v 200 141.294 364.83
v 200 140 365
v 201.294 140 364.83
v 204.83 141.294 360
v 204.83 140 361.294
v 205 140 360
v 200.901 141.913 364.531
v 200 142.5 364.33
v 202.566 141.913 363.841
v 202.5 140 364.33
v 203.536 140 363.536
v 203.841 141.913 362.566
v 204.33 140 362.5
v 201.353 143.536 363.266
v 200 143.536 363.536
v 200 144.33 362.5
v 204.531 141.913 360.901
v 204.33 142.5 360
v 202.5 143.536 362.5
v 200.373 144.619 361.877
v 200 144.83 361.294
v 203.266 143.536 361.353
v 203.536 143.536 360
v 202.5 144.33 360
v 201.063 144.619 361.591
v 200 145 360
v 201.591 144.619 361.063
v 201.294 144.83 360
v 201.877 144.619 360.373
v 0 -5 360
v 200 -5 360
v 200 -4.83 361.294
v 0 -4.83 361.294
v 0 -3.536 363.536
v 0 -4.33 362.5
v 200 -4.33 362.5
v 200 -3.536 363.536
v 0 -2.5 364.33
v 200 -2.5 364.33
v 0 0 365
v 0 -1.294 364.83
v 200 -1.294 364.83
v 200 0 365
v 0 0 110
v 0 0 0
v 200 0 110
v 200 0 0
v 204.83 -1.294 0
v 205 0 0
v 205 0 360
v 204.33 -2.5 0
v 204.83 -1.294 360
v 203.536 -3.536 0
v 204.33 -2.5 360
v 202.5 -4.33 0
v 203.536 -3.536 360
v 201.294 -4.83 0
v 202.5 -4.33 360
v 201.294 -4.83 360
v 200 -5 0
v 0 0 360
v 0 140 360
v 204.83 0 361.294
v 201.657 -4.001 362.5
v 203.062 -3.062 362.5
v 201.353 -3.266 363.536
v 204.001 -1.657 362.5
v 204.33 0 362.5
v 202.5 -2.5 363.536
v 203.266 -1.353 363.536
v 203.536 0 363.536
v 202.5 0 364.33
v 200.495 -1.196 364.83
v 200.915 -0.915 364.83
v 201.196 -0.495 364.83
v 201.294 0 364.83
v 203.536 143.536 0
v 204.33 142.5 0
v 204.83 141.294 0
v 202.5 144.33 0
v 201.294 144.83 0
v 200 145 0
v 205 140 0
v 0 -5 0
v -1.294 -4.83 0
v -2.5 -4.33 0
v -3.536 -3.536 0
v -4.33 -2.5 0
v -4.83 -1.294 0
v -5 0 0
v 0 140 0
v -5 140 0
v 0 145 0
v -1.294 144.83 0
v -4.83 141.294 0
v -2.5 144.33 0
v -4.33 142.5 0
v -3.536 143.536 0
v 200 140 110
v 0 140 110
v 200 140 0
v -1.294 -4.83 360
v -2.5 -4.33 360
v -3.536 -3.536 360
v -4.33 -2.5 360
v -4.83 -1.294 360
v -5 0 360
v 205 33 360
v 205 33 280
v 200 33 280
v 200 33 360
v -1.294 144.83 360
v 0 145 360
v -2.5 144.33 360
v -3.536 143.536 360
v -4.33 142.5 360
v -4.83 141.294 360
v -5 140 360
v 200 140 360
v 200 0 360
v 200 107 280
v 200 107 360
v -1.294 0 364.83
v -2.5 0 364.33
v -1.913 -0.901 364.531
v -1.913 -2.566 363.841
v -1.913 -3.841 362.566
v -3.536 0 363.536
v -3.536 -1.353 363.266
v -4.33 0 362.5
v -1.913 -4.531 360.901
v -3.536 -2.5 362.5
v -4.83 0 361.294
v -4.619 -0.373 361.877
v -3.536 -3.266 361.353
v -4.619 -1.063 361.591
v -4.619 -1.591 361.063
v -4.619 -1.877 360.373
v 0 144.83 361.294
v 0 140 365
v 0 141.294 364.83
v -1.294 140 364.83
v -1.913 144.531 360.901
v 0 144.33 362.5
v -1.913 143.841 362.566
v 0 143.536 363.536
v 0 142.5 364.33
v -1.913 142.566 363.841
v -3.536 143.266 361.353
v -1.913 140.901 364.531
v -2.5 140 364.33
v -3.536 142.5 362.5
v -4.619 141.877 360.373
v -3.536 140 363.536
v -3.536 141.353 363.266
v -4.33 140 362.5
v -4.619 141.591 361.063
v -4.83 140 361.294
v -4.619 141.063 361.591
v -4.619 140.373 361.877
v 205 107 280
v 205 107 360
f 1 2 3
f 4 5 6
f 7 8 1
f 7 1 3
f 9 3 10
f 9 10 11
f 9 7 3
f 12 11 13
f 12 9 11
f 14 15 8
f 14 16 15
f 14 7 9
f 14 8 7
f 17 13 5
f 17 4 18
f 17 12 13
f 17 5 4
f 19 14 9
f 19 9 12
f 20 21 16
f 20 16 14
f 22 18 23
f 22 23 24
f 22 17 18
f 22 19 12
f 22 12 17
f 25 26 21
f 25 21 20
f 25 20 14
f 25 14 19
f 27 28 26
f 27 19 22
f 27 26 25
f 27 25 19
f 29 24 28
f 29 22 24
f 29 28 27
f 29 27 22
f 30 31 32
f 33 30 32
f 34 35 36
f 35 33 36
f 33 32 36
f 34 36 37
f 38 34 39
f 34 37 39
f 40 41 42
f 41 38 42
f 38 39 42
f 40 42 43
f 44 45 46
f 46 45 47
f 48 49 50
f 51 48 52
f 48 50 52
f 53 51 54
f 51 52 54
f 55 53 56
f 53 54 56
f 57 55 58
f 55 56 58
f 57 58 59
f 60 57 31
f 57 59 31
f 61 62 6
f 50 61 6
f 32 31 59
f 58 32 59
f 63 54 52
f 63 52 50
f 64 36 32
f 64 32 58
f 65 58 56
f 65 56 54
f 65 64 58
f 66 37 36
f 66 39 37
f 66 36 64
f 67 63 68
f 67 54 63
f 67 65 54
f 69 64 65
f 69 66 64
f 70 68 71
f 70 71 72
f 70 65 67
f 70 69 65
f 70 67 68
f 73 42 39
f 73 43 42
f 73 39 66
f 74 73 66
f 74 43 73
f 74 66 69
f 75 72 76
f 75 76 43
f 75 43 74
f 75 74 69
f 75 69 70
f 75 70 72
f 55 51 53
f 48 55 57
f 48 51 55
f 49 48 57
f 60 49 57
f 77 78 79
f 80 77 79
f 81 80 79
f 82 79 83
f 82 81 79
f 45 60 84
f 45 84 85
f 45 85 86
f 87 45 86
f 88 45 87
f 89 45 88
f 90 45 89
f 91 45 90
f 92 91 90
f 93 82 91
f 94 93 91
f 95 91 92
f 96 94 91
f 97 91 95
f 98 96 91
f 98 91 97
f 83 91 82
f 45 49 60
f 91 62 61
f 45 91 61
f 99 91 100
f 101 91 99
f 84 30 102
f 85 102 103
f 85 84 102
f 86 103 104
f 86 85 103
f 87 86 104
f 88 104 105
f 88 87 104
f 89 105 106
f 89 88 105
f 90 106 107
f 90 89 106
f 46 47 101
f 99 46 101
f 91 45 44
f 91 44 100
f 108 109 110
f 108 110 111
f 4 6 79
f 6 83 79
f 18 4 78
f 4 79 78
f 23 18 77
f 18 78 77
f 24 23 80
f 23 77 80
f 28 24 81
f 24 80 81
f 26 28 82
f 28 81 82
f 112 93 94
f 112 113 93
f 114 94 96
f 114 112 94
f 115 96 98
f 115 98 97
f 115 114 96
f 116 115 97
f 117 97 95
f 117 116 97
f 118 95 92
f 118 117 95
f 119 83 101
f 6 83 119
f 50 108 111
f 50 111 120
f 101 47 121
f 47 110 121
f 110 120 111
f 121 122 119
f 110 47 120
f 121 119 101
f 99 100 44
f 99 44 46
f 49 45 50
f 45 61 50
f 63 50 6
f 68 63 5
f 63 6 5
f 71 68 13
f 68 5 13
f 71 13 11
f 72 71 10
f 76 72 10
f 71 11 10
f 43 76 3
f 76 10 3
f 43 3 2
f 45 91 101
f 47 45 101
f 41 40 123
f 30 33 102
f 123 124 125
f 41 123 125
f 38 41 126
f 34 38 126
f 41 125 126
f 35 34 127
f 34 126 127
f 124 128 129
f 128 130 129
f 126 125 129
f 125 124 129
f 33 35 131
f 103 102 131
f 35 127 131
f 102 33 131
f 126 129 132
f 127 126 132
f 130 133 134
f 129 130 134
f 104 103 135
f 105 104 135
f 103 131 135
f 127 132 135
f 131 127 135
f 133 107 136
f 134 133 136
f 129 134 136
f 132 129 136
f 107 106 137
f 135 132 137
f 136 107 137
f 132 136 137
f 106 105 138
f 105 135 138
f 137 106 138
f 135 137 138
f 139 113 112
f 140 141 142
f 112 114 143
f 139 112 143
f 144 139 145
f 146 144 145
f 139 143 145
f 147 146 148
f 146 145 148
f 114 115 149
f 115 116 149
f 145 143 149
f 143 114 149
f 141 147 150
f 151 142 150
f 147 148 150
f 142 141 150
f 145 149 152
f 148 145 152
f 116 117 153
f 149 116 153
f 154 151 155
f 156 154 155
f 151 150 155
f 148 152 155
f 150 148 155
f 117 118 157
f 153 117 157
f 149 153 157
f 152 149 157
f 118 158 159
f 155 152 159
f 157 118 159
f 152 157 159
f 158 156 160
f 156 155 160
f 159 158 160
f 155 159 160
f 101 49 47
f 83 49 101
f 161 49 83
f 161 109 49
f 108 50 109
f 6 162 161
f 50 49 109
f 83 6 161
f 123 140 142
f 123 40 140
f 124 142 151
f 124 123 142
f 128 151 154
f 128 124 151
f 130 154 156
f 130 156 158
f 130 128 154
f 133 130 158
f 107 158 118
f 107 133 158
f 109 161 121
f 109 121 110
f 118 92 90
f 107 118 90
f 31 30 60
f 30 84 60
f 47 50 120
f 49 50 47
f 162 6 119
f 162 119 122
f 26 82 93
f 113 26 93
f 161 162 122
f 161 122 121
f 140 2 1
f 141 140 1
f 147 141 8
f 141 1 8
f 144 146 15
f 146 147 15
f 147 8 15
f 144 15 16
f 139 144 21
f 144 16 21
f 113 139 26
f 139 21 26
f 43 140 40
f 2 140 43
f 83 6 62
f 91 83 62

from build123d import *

# Parameters (mm, degrees)
F0_W      = 205
F0_H      = 360
F1_DEPTH  = 5
F2_W      = 150
F2_H      = 360
F3_DEPTH  = 5
F4_W      = 205
F4_H      = 360
F5_DEPTH  = 5
F6_W      = 205
F6_H      = 140
F7_DEPTH  = 5
F9_DEPTH  = 5
F10_R     = 5
F11_R     = 4.99999
F12_R     = 4.99999
F13_R     = 4.99999
F14_W     = 200
F14_H     = 140
F15_DEPTH = 110


# Not quite as in the source:
# - a fillet or chamfer is up to 0.001 mm smaller than in the source, because OpenCascade refuses the exact size


with BuildPart() as f1:
    # F0 (on Front) → F1 (new body)
    with BuildSketch(Plane.XZ):
        with Locations((102.5, 180)):
            Rectangle(F0_W, F0_H)
    extrude(amount=F1_DEPTH)

    # F2 (on face) → F3 (join)
    with BuildSketch(Plane(origin=(0, 0, 0), x_dir=(0, -1, 0), z_dir=(-1, 0, 0))):
        with Locations((-70, 180)):
            Rectangle(F2_W, F2_H)
    extrude(amount=F3_DEPTH)

    # F4 (on face) → F5 (join)
    with BuildSketch(Plane(origin=(0, 145, 0), x_dir=(-1, 0, 0), z_dir=(0, 1, 0))):
        with Locations((-102.5, 180)):
            Rectangle(F4_W, F4_H)
    extrude(amount=-F5_DEPTH)

    # F6 (on face) → F7 (join)
    with BuildSketch(Plane.XY.offset(360)):
        Polygon((-5, 145), (-5, -5), (205, -5), (205, 0), (0, 0), (0, 140), (205, 140), (205, 145), align=None)
        with Locations((102.5, 70)):
            Rectangle(F6_W, F6_H)
    extrude(amount=F7_DEPTH)

    # F10
    f10_edges = [f1.edges().sort_by_distance(p)[0] for p in [
        (205, -5, 182.5),
    ]]
    fillet(f10_edges, radius=F10_R)

    # F11 (radius 5 in the source; OpenCascade refuses exactly that, so slightly less here)
    f11_edges = [f1.edges().sort_by_distance(p)[0] for p in [
        (205, 72.5, 365),
    ]]
    fillet(f11_edges, radius=F11_R)

    # F12 (radius 5 in the source; OpenCascade refuses exactly that, so slightly less here)
    f12_edges = [f1.edges().sort_by_distance(p)[0] for p in [
        (205, 145, 180.000005),
    ]]
    fillet(f12_edges, radius=F12_R)

    # F13 (radius 5 in the source; OpenCascade refuses exactly that, so slightly less here)
    f13_edges = [f1.edges().sort_by_distance(p)[0] for p in [
        (-5, 70, 365),
    ]]
    fillet(f13_edges, radius=F13_R)


with BuildPart() as f9:
    # F8 (on face) → F9 (new body)
    with BuildSketch(Plane.YZ.offset(205)):
        Polygon((33, 280), (33, 360), (0, 360), (0, 0), (140, 0), (140, 360), (107, 360), (107, 280), align=None)
    extrude(amount=-F9_DEPTH)


with BuildPart() as f15:
    # F14 (on Top) → F15 (new body)
    with BuildSketch(Plane.XY):
        with Locations((100, 70)):
            Rectangle(F14_W, F14_H)
    extrude(amount=F15_DEPTH)


solid = Compound([f1.part, f9.part, f15.part])
